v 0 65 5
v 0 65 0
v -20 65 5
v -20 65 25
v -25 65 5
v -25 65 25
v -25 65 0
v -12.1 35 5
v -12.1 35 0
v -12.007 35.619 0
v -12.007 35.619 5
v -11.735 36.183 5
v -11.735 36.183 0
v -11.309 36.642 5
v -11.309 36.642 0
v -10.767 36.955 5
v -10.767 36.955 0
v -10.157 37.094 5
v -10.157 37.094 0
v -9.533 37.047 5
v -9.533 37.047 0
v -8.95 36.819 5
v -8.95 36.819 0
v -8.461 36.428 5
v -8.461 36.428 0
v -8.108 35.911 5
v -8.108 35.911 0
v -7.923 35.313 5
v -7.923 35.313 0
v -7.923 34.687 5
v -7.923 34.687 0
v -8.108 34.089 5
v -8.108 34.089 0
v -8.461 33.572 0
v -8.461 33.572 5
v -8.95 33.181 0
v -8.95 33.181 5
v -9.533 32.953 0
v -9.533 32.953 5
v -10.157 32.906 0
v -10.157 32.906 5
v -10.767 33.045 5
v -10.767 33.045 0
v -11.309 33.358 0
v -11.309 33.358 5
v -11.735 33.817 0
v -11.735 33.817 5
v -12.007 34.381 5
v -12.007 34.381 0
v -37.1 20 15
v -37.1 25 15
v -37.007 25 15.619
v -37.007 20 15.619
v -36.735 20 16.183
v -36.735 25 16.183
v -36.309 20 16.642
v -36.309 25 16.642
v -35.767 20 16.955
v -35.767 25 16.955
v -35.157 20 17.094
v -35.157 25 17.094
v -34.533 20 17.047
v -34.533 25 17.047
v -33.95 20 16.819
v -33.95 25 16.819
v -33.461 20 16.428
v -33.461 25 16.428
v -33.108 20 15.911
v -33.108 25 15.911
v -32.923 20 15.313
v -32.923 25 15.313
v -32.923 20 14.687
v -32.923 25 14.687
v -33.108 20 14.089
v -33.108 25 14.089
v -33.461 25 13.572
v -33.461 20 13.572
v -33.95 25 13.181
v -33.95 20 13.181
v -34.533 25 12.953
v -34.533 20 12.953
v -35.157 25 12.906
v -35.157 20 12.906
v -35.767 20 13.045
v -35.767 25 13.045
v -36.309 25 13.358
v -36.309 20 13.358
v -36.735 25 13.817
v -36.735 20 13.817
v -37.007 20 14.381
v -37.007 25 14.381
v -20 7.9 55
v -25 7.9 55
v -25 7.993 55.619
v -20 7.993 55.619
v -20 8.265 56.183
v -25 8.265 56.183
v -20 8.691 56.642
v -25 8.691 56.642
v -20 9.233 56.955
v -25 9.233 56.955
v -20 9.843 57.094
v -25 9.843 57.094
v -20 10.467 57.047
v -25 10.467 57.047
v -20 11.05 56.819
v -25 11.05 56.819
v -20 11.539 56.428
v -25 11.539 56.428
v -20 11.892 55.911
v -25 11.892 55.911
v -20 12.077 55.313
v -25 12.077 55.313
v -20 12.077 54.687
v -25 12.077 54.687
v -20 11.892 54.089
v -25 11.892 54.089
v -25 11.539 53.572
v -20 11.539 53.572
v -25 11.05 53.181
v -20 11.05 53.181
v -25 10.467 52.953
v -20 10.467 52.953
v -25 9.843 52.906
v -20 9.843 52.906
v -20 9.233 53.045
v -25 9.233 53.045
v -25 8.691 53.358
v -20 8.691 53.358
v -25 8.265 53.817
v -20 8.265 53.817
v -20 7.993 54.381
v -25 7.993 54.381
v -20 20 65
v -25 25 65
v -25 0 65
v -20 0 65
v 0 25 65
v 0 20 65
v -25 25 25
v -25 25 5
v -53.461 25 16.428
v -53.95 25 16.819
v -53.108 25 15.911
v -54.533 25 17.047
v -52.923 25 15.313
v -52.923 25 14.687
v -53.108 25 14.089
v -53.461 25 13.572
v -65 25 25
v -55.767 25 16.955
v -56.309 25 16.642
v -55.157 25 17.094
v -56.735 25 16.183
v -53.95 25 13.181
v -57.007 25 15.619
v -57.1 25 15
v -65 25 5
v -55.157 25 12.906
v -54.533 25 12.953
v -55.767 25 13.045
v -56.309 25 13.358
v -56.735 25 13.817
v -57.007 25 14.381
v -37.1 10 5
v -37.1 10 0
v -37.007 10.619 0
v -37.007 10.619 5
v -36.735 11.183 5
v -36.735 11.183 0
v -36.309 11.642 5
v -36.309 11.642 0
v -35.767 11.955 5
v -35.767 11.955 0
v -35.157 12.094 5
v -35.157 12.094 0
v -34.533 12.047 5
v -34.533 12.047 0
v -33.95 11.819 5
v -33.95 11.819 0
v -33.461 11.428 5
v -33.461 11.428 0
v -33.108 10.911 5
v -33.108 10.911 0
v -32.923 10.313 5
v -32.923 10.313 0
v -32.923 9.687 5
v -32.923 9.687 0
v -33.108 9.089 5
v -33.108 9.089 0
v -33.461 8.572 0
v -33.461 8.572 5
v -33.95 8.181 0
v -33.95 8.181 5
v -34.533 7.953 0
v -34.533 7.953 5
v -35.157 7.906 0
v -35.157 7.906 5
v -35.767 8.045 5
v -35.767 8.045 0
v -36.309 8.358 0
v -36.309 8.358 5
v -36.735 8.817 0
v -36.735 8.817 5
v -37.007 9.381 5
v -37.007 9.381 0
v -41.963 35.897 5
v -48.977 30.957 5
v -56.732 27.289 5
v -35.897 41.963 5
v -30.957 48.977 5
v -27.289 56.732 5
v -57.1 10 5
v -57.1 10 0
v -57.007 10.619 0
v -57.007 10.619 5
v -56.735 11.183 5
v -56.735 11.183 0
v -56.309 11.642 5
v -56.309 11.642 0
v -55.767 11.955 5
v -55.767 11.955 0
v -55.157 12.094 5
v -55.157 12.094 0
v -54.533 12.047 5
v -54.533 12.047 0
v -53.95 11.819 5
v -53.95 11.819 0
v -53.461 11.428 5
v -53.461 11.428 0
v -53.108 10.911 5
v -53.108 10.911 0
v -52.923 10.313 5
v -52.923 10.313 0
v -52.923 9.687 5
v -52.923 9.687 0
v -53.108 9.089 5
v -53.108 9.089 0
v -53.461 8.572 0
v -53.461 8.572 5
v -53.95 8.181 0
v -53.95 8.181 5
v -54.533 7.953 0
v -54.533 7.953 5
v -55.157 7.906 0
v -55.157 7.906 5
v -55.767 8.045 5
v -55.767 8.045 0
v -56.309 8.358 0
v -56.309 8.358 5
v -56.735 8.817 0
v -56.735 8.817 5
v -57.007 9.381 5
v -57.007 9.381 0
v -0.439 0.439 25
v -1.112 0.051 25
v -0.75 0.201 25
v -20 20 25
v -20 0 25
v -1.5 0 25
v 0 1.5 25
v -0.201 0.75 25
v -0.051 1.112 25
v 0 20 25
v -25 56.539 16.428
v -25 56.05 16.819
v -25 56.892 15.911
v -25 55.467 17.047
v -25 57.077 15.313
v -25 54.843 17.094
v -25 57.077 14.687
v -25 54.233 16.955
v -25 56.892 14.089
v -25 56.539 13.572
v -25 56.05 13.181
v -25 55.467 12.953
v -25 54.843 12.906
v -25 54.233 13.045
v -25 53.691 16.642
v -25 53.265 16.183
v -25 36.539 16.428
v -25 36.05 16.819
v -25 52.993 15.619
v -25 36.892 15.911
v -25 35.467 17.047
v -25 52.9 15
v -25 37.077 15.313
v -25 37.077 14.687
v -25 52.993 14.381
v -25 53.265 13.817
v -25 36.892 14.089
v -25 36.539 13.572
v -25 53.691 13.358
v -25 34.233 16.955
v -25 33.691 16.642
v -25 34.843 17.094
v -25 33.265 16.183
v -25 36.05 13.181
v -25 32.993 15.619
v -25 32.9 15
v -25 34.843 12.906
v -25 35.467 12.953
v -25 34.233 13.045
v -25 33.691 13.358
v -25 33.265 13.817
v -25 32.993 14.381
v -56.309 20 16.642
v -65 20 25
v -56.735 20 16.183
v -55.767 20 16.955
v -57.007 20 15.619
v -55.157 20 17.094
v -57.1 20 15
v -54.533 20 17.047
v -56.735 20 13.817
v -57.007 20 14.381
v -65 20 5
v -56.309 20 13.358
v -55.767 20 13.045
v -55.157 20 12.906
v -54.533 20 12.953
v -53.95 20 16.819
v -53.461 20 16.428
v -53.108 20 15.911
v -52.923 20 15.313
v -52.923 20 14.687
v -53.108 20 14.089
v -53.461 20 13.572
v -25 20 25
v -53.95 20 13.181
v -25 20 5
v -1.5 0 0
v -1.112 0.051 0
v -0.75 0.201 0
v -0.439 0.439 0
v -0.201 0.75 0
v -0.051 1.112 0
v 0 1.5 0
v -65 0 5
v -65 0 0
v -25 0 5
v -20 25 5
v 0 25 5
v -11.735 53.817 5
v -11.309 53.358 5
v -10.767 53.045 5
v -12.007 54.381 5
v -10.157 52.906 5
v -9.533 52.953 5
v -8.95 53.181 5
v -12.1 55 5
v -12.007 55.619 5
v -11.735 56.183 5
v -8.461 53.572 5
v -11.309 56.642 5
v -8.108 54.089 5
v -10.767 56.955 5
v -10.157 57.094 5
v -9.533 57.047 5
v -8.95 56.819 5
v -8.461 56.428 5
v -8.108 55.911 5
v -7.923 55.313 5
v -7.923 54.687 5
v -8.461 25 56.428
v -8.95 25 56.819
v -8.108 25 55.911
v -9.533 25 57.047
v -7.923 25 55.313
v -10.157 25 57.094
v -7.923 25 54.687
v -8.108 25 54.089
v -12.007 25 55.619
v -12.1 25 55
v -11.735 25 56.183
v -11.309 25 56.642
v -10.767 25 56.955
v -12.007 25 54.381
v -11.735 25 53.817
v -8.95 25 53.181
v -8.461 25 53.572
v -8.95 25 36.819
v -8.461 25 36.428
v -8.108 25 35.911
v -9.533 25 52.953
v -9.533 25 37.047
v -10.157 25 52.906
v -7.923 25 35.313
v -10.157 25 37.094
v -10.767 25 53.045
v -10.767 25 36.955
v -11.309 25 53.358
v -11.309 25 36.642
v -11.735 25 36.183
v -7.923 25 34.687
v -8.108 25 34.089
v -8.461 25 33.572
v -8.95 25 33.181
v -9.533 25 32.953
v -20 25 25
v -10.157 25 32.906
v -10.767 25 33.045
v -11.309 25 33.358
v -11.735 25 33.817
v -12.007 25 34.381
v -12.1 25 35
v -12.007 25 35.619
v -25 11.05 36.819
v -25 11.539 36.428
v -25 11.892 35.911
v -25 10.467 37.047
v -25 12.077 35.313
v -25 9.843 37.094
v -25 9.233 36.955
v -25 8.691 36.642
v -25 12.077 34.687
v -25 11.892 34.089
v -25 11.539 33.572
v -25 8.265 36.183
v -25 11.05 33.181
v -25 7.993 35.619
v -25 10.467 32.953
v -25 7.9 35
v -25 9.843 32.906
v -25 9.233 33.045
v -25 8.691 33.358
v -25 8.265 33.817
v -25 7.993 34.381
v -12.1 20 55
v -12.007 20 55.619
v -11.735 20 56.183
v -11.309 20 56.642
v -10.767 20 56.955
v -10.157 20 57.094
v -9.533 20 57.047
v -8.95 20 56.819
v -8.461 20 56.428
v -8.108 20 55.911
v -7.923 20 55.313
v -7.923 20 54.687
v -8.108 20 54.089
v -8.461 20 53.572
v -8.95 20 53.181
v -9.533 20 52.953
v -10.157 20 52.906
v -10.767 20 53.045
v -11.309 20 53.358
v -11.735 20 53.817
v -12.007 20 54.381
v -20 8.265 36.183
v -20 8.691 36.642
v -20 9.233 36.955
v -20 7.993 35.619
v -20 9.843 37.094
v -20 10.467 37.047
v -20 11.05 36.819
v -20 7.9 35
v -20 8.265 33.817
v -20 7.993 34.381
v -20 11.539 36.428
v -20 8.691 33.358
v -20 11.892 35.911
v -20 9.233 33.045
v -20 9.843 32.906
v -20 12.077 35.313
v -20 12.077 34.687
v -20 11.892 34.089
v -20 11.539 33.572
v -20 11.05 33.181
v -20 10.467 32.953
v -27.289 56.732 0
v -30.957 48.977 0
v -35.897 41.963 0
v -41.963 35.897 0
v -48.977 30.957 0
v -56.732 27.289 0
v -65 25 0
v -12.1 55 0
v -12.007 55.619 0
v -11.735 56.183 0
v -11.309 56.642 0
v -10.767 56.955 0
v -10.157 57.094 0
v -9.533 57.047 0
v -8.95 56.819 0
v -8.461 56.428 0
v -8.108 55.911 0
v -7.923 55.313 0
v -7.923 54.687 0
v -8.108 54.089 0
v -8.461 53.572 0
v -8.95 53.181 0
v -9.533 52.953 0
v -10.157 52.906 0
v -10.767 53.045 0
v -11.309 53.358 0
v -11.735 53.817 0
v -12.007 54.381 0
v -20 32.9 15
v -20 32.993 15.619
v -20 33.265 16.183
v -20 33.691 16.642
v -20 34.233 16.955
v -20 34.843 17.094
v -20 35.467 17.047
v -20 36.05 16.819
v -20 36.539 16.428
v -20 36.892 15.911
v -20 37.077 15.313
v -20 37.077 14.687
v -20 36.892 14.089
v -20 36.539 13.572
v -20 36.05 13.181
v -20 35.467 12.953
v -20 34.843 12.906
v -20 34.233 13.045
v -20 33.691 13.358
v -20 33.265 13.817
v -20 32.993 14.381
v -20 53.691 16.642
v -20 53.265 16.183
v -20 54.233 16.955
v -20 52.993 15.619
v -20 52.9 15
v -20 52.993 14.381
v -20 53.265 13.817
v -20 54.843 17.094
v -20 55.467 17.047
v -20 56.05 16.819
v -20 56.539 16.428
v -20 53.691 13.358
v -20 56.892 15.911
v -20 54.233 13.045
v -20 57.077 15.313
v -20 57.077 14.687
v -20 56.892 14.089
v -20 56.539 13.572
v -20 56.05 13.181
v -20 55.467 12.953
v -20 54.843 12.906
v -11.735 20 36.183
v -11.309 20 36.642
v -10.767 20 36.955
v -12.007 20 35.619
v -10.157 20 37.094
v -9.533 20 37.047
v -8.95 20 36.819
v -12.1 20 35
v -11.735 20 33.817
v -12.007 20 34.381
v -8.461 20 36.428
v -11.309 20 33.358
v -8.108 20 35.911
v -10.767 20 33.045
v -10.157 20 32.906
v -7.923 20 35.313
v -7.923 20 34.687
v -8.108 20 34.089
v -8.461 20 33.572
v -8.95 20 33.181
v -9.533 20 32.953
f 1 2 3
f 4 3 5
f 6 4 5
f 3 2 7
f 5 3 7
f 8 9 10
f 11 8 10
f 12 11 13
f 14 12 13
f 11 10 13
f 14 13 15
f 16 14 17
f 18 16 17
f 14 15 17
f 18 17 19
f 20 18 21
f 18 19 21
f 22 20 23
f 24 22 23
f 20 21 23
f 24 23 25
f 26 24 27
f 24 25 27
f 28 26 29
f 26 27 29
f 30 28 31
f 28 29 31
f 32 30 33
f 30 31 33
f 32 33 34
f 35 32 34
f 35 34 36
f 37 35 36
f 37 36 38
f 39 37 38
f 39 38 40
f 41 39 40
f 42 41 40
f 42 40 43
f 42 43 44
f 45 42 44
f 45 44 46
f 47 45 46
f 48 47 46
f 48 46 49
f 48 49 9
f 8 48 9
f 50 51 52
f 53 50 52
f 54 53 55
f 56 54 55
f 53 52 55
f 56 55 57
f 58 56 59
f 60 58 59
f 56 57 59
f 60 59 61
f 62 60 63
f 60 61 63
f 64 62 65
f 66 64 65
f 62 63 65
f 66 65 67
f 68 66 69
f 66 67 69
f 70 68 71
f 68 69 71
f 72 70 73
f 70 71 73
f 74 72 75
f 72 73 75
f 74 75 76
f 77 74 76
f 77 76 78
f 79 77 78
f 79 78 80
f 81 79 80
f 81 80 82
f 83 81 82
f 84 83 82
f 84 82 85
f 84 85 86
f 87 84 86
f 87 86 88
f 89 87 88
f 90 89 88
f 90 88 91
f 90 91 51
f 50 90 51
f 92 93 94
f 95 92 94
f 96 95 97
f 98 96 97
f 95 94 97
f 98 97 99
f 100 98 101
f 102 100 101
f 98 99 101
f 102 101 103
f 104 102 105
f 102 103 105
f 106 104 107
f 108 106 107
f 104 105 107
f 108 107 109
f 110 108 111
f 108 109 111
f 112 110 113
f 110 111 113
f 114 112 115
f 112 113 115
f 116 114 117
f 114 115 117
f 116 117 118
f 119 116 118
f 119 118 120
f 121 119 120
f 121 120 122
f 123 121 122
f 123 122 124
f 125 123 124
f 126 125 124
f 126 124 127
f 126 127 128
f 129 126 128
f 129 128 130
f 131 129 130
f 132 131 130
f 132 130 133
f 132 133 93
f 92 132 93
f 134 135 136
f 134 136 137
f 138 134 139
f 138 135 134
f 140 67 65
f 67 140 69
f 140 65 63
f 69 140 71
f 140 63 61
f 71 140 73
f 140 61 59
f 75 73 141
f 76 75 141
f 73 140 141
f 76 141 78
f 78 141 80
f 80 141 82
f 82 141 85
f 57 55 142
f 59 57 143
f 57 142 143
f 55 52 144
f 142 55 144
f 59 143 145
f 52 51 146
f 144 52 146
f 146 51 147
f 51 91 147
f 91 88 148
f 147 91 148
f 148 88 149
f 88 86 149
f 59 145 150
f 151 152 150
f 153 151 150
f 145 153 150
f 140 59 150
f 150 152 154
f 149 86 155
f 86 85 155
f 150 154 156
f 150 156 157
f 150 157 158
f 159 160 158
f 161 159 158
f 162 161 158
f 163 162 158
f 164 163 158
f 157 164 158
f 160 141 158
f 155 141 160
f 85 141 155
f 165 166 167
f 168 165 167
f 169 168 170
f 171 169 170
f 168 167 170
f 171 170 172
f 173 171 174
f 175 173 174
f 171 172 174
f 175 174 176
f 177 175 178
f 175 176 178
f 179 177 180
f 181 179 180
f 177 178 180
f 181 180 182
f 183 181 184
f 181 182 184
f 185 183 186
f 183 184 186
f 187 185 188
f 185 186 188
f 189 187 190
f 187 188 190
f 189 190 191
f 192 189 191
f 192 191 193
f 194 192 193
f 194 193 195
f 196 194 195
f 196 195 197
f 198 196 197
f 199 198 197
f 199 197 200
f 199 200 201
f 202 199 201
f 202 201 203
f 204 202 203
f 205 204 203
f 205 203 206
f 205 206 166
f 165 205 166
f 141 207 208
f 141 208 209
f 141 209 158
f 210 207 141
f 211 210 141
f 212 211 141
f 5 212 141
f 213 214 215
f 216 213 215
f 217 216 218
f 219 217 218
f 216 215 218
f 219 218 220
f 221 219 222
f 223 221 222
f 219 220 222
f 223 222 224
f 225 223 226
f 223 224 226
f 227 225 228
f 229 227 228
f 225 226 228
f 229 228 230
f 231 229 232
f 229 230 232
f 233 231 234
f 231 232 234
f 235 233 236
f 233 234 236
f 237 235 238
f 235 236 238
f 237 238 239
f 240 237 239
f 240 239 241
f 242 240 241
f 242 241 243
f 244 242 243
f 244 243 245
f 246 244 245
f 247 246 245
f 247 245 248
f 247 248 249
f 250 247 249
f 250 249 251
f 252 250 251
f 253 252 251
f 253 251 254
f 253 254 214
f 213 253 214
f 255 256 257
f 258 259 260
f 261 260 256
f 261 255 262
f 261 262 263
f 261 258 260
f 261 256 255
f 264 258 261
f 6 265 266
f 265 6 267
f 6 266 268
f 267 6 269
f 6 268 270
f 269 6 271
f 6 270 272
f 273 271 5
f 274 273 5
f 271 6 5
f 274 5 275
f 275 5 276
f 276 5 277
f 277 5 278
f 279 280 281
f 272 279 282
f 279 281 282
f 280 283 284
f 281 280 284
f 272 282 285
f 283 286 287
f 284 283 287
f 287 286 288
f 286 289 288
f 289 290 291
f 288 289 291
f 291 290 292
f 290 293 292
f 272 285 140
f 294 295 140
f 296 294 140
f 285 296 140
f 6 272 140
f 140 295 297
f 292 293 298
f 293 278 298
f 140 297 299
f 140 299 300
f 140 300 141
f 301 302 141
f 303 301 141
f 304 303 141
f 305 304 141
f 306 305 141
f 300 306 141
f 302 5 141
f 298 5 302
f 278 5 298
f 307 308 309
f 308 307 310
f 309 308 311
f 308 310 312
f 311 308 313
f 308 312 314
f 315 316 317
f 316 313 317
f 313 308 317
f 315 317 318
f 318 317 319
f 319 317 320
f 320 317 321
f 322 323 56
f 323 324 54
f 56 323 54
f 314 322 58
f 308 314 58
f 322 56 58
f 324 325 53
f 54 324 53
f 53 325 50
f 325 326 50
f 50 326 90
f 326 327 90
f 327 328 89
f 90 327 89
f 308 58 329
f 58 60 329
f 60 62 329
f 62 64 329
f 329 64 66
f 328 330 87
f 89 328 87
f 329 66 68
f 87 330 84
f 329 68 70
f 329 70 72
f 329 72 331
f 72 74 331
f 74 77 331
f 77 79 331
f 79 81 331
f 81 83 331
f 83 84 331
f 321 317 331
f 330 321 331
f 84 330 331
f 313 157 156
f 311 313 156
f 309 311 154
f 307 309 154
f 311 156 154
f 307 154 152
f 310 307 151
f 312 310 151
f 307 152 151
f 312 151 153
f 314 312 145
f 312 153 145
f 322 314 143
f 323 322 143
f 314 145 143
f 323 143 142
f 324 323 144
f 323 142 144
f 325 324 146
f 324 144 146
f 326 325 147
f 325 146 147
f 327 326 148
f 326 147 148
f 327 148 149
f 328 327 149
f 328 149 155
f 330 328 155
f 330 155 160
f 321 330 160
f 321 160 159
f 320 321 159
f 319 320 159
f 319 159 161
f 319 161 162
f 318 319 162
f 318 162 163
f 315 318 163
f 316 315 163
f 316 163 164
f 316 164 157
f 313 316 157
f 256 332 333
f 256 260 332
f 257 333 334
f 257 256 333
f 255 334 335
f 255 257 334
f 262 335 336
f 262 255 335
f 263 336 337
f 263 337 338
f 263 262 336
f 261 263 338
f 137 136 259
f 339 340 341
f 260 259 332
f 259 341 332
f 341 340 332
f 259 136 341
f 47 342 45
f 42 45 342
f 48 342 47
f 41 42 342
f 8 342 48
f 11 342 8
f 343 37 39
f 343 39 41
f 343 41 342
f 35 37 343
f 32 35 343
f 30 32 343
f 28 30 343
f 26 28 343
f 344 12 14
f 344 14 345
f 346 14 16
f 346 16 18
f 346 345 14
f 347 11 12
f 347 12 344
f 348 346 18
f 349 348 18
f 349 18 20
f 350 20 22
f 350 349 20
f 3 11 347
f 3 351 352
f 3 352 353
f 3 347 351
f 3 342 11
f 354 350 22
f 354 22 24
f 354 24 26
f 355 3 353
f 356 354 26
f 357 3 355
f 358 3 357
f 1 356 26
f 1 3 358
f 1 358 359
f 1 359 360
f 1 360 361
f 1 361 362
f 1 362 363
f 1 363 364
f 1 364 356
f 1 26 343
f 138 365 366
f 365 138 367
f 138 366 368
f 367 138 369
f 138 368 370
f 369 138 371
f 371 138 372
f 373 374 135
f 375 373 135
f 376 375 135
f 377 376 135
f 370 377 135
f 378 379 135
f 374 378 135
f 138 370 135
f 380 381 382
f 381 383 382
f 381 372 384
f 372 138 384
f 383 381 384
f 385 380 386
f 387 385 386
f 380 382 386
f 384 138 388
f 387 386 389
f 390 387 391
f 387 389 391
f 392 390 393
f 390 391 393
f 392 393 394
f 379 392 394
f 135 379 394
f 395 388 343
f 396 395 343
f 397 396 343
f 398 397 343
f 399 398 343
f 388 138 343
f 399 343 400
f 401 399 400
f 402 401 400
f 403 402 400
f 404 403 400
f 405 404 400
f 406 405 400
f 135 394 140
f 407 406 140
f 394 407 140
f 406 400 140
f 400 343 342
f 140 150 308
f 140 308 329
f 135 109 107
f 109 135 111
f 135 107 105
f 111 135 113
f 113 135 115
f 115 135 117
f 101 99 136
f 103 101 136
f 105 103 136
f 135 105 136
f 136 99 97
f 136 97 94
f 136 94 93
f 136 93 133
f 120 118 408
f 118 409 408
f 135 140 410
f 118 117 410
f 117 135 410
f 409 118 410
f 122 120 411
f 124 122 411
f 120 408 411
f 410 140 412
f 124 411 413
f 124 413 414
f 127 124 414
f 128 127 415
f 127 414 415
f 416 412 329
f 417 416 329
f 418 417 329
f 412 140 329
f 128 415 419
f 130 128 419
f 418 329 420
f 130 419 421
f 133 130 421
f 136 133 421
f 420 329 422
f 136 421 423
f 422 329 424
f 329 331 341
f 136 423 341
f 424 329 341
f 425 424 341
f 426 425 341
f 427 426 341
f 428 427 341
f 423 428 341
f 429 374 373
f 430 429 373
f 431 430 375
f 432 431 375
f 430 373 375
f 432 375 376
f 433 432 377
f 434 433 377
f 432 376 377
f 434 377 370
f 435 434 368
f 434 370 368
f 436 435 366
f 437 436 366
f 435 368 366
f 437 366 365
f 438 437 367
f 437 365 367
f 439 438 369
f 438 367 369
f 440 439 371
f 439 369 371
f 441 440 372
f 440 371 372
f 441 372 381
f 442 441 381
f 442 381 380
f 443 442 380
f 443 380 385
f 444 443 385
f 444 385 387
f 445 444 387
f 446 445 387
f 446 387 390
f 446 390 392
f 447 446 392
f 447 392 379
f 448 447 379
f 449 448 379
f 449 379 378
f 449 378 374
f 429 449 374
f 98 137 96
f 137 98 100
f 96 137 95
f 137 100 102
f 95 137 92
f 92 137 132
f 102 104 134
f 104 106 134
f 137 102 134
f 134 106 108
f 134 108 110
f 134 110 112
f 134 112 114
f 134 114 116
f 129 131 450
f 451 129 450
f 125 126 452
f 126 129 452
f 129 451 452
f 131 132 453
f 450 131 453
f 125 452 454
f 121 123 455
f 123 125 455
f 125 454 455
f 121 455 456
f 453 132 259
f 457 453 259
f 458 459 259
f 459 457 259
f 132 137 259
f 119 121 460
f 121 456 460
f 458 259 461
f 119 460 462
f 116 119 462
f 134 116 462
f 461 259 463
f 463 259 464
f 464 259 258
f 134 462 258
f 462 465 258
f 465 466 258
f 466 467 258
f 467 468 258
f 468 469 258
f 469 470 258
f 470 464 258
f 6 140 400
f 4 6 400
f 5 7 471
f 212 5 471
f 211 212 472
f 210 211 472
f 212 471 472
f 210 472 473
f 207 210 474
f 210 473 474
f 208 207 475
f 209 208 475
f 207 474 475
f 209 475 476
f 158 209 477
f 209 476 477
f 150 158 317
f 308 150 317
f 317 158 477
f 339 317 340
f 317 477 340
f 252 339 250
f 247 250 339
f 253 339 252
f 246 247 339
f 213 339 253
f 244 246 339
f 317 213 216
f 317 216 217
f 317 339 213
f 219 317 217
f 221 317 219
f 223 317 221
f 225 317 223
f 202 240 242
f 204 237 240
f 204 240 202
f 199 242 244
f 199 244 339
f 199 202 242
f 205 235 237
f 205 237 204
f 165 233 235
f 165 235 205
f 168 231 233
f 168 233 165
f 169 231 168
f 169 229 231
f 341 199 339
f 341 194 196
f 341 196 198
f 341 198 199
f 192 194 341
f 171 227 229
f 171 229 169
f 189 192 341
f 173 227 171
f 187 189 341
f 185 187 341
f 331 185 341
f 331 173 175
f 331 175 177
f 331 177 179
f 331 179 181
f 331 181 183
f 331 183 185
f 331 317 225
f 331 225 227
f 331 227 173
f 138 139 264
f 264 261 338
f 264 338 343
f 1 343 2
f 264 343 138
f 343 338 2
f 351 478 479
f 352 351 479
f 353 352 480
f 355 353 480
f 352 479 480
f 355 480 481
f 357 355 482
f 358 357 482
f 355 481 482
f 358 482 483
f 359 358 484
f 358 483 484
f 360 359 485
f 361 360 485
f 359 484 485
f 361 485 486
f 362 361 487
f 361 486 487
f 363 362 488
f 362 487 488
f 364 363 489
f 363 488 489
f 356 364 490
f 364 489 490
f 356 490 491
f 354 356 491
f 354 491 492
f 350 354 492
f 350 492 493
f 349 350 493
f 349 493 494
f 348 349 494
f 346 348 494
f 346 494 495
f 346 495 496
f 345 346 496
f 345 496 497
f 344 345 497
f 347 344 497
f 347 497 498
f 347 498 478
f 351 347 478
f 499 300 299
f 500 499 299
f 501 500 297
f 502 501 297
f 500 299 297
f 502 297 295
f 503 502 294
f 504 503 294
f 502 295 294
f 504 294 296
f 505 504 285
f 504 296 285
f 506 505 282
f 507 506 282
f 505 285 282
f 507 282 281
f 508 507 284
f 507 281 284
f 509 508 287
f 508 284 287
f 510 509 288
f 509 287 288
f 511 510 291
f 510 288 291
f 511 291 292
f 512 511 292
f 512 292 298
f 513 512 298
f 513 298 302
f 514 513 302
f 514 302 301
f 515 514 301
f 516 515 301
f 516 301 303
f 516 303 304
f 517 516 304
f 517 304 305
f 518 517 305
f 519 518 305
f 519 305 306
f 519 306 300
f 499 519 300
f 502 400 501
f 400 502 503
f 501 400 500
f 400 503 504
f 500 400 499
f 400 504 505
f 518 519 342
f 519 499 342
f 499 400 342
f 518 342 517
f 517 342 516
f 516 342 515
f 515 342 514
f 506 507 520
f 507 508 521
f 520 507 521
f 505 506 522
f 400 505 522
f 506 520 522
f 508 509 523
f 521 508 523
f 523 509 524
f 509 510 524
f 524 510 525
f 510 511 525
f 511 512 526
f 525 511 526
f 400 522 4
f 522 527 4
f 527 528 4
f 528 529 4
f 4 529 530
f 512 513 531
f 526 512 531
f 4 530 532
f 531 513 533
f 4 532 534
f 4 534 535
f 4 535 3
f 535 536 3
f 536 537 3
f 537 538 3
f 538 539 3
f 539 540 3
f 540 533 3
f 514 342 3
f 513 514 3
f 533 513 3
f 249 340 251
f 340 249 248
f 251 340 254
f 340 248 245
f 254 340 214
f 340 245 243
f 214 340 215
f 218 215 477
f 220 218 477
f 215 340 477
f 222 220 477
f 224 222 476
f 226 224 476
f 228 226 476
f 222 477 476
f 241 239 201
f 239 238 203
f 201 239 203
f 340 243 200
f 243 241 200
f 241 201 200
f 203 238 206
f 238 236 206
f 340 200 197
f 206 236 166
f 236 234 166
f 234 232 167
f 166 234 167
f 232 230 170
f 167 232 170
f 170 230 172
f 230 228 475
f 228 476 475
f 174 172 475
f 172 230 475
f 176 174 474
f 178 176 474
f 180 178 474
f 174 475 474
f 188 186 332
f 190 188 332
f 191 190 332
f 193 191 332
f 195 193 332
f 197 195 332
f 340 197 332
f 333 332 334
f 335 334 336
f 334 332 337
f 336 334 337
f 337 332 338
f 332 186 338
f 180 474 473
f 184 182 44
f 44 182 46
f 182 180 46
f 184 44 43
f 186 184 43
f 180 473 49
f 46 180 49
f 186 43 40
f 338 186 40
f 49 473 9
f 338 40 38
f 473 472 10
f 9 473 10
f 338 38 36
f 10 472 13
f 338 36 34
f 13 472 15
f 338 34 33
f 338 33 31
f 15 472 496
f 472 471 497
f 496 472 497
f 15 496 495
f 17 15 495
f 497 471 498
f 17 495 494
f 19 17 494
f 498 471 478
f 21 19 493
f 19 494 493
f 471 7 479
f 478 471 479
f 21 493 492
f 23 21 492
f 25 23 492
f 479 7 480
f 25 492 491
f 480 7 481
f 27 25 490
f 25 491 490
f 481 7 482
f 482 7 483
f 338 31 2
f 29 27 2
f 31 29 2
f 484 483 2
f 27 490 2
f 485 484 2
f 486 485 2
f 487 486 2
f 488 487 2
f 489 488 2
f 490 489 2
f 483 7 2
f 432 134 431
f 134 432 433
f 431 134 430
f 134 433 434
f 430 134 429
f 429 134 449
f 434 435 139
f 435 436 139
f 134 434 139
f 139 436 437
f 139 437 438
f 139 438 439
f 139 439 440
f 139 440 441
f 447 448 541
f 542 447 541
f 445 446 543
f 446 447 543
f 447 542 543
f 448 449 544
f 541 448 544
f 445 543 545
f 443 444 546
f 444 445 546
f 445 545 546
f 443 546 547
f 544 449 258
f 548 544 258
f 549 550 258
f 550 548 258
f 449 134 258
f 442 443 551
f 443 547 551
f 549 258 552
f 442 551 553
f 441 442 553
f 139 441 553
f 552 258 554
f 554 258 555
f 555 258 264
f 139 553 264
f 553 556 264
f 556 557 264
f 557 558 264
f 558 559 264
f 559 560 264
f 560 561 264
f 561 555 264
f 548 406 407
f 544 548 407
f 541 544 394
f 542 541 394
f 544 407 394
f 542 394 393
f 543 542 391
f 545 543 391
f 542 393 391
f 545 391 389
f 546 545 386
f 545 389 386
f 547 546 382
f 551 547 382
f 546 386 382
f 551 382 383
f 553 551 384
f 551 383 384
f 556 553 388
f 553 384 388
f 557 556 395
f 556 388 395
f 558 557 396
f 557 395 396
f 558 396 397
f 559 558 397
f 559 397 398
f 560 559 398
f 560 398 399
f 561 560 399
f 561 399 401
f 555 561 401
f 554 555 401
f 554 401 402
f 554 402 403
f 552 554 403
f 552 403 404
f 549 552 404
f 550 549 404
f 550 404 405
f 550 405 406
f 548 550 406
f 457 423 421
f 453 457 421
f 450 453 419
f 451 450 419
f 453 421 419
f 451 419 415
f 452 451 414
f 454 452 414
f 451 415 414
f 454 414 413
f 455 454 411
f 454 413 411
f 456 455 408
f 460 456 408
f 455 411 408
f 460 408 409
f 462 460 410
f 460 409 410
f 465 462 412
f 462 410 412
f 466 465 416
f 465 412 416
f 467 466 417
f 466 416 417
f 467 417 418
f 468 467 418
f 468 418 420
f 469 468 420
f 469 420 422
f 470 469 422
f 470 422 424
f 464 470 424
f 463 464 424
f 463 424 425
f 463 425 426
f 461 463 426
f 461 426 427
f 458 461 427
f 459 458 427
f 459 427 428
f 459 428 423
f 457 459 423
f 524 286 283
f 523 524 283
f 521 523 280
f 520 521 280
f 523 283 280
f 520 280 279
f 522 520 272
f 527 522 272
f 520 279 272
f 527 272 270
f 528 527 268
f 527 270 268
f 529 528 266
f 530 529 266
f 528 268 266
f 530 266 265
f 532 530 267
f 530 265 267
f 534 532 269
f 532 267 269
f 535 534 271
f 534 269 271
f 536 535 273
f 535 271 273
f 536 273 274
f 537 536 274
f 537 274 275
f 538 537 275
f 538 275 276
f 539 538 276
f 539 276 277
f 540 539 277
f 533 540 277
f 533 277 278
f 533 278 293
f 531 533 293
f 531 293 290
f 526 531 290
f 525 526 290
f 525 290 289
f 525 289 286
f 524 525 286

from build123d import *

# Parameters (mm, degrees)
F1_DEPTH     = 5
F3_DEPTH     = 20
F5_DEPTH     = 40
F6_W         = 20
F6_H         = 20
F7_DEPTH     = 20
F8_R         = 1.5
F12_D        = 4.2
F12_ON_F11_D = 4.2
F12_ON_F10_D = 4.2


with BuildPart() as f1:
    # F0 (on Top) → F1 (new body)
    with BuildSketch(Plane.XY):
        with BuildLine():
            Line((-65, 0), (0, 0))
            Line((0, 0), (0, 65))
            Line((0, 65), (-25, 65))
            ThreePointArc((-25, 65), (-38.7994204149, 38.7994204149), (-65, 25))
            Line((-65, 25), (-65, 0))
        make_face()
    extrude(amount=F1_DEPTH)

    # F2 (on face) → F3 (join)
    with BuildSketch(Plane.XY.offset(5)):
        Polygon((-25, 25), (-65, 25), (-65, 20), (-25, 20), (-25, 0), (-20, 0), (-20, 20), (0, 20), (0, 25), (-20, 25), (-20, 65), (-25, 65), align=None)
    extrude(amount=F3_DEPTH)

    # F4 (on face) → F5 (join)
    with BuildSketch(Plane.XY.offset(25)):
        Polygon((0, 25), (-25, 25), (-25, 0), (-20, 0), (-20, 20), (0, 20), align=None)
    extrude(amount=F5_DEPTH)

    # F6 (on face) → F7 (join)
    with BuildSketch(Plane.XY.offset(5)):
        with Locations((-10, 10)):
            Rectangle(F6_W, F6_H)
    extrude(amount=F7_DEPTH)

    # F8
    f8_edges = [f1.edges().sort_by_distance(p)[0] for p in [
        (0, 0, 12.5),
    ]]
    fillet(f8_edges, radius=F8_R)

    # F12 (through all)
    with Locations(Plane.XZ.offset(-20)):
        with Locations((-55, 15), (-35, 15), (-10, 35), (-10, 55)):
            Hole(F12_D / 2)

    # F12 on F11 (through all)
    with Locations(Plane.XY.offset(5)):
        with Locations((-35, 10), (-55, 10), (-10, 55), (-10, 35)):
            Hole(F12_ON_F11_D / 2)

    # F12 on F10 (through all)
    with Locations(Plane.YZ.offset(-20)):
        with Locations((10, 35), (10, 55), (35, 15), (55, 15)):
            Hole(F12_ON_F10_D / 2)


solid = f1.part
